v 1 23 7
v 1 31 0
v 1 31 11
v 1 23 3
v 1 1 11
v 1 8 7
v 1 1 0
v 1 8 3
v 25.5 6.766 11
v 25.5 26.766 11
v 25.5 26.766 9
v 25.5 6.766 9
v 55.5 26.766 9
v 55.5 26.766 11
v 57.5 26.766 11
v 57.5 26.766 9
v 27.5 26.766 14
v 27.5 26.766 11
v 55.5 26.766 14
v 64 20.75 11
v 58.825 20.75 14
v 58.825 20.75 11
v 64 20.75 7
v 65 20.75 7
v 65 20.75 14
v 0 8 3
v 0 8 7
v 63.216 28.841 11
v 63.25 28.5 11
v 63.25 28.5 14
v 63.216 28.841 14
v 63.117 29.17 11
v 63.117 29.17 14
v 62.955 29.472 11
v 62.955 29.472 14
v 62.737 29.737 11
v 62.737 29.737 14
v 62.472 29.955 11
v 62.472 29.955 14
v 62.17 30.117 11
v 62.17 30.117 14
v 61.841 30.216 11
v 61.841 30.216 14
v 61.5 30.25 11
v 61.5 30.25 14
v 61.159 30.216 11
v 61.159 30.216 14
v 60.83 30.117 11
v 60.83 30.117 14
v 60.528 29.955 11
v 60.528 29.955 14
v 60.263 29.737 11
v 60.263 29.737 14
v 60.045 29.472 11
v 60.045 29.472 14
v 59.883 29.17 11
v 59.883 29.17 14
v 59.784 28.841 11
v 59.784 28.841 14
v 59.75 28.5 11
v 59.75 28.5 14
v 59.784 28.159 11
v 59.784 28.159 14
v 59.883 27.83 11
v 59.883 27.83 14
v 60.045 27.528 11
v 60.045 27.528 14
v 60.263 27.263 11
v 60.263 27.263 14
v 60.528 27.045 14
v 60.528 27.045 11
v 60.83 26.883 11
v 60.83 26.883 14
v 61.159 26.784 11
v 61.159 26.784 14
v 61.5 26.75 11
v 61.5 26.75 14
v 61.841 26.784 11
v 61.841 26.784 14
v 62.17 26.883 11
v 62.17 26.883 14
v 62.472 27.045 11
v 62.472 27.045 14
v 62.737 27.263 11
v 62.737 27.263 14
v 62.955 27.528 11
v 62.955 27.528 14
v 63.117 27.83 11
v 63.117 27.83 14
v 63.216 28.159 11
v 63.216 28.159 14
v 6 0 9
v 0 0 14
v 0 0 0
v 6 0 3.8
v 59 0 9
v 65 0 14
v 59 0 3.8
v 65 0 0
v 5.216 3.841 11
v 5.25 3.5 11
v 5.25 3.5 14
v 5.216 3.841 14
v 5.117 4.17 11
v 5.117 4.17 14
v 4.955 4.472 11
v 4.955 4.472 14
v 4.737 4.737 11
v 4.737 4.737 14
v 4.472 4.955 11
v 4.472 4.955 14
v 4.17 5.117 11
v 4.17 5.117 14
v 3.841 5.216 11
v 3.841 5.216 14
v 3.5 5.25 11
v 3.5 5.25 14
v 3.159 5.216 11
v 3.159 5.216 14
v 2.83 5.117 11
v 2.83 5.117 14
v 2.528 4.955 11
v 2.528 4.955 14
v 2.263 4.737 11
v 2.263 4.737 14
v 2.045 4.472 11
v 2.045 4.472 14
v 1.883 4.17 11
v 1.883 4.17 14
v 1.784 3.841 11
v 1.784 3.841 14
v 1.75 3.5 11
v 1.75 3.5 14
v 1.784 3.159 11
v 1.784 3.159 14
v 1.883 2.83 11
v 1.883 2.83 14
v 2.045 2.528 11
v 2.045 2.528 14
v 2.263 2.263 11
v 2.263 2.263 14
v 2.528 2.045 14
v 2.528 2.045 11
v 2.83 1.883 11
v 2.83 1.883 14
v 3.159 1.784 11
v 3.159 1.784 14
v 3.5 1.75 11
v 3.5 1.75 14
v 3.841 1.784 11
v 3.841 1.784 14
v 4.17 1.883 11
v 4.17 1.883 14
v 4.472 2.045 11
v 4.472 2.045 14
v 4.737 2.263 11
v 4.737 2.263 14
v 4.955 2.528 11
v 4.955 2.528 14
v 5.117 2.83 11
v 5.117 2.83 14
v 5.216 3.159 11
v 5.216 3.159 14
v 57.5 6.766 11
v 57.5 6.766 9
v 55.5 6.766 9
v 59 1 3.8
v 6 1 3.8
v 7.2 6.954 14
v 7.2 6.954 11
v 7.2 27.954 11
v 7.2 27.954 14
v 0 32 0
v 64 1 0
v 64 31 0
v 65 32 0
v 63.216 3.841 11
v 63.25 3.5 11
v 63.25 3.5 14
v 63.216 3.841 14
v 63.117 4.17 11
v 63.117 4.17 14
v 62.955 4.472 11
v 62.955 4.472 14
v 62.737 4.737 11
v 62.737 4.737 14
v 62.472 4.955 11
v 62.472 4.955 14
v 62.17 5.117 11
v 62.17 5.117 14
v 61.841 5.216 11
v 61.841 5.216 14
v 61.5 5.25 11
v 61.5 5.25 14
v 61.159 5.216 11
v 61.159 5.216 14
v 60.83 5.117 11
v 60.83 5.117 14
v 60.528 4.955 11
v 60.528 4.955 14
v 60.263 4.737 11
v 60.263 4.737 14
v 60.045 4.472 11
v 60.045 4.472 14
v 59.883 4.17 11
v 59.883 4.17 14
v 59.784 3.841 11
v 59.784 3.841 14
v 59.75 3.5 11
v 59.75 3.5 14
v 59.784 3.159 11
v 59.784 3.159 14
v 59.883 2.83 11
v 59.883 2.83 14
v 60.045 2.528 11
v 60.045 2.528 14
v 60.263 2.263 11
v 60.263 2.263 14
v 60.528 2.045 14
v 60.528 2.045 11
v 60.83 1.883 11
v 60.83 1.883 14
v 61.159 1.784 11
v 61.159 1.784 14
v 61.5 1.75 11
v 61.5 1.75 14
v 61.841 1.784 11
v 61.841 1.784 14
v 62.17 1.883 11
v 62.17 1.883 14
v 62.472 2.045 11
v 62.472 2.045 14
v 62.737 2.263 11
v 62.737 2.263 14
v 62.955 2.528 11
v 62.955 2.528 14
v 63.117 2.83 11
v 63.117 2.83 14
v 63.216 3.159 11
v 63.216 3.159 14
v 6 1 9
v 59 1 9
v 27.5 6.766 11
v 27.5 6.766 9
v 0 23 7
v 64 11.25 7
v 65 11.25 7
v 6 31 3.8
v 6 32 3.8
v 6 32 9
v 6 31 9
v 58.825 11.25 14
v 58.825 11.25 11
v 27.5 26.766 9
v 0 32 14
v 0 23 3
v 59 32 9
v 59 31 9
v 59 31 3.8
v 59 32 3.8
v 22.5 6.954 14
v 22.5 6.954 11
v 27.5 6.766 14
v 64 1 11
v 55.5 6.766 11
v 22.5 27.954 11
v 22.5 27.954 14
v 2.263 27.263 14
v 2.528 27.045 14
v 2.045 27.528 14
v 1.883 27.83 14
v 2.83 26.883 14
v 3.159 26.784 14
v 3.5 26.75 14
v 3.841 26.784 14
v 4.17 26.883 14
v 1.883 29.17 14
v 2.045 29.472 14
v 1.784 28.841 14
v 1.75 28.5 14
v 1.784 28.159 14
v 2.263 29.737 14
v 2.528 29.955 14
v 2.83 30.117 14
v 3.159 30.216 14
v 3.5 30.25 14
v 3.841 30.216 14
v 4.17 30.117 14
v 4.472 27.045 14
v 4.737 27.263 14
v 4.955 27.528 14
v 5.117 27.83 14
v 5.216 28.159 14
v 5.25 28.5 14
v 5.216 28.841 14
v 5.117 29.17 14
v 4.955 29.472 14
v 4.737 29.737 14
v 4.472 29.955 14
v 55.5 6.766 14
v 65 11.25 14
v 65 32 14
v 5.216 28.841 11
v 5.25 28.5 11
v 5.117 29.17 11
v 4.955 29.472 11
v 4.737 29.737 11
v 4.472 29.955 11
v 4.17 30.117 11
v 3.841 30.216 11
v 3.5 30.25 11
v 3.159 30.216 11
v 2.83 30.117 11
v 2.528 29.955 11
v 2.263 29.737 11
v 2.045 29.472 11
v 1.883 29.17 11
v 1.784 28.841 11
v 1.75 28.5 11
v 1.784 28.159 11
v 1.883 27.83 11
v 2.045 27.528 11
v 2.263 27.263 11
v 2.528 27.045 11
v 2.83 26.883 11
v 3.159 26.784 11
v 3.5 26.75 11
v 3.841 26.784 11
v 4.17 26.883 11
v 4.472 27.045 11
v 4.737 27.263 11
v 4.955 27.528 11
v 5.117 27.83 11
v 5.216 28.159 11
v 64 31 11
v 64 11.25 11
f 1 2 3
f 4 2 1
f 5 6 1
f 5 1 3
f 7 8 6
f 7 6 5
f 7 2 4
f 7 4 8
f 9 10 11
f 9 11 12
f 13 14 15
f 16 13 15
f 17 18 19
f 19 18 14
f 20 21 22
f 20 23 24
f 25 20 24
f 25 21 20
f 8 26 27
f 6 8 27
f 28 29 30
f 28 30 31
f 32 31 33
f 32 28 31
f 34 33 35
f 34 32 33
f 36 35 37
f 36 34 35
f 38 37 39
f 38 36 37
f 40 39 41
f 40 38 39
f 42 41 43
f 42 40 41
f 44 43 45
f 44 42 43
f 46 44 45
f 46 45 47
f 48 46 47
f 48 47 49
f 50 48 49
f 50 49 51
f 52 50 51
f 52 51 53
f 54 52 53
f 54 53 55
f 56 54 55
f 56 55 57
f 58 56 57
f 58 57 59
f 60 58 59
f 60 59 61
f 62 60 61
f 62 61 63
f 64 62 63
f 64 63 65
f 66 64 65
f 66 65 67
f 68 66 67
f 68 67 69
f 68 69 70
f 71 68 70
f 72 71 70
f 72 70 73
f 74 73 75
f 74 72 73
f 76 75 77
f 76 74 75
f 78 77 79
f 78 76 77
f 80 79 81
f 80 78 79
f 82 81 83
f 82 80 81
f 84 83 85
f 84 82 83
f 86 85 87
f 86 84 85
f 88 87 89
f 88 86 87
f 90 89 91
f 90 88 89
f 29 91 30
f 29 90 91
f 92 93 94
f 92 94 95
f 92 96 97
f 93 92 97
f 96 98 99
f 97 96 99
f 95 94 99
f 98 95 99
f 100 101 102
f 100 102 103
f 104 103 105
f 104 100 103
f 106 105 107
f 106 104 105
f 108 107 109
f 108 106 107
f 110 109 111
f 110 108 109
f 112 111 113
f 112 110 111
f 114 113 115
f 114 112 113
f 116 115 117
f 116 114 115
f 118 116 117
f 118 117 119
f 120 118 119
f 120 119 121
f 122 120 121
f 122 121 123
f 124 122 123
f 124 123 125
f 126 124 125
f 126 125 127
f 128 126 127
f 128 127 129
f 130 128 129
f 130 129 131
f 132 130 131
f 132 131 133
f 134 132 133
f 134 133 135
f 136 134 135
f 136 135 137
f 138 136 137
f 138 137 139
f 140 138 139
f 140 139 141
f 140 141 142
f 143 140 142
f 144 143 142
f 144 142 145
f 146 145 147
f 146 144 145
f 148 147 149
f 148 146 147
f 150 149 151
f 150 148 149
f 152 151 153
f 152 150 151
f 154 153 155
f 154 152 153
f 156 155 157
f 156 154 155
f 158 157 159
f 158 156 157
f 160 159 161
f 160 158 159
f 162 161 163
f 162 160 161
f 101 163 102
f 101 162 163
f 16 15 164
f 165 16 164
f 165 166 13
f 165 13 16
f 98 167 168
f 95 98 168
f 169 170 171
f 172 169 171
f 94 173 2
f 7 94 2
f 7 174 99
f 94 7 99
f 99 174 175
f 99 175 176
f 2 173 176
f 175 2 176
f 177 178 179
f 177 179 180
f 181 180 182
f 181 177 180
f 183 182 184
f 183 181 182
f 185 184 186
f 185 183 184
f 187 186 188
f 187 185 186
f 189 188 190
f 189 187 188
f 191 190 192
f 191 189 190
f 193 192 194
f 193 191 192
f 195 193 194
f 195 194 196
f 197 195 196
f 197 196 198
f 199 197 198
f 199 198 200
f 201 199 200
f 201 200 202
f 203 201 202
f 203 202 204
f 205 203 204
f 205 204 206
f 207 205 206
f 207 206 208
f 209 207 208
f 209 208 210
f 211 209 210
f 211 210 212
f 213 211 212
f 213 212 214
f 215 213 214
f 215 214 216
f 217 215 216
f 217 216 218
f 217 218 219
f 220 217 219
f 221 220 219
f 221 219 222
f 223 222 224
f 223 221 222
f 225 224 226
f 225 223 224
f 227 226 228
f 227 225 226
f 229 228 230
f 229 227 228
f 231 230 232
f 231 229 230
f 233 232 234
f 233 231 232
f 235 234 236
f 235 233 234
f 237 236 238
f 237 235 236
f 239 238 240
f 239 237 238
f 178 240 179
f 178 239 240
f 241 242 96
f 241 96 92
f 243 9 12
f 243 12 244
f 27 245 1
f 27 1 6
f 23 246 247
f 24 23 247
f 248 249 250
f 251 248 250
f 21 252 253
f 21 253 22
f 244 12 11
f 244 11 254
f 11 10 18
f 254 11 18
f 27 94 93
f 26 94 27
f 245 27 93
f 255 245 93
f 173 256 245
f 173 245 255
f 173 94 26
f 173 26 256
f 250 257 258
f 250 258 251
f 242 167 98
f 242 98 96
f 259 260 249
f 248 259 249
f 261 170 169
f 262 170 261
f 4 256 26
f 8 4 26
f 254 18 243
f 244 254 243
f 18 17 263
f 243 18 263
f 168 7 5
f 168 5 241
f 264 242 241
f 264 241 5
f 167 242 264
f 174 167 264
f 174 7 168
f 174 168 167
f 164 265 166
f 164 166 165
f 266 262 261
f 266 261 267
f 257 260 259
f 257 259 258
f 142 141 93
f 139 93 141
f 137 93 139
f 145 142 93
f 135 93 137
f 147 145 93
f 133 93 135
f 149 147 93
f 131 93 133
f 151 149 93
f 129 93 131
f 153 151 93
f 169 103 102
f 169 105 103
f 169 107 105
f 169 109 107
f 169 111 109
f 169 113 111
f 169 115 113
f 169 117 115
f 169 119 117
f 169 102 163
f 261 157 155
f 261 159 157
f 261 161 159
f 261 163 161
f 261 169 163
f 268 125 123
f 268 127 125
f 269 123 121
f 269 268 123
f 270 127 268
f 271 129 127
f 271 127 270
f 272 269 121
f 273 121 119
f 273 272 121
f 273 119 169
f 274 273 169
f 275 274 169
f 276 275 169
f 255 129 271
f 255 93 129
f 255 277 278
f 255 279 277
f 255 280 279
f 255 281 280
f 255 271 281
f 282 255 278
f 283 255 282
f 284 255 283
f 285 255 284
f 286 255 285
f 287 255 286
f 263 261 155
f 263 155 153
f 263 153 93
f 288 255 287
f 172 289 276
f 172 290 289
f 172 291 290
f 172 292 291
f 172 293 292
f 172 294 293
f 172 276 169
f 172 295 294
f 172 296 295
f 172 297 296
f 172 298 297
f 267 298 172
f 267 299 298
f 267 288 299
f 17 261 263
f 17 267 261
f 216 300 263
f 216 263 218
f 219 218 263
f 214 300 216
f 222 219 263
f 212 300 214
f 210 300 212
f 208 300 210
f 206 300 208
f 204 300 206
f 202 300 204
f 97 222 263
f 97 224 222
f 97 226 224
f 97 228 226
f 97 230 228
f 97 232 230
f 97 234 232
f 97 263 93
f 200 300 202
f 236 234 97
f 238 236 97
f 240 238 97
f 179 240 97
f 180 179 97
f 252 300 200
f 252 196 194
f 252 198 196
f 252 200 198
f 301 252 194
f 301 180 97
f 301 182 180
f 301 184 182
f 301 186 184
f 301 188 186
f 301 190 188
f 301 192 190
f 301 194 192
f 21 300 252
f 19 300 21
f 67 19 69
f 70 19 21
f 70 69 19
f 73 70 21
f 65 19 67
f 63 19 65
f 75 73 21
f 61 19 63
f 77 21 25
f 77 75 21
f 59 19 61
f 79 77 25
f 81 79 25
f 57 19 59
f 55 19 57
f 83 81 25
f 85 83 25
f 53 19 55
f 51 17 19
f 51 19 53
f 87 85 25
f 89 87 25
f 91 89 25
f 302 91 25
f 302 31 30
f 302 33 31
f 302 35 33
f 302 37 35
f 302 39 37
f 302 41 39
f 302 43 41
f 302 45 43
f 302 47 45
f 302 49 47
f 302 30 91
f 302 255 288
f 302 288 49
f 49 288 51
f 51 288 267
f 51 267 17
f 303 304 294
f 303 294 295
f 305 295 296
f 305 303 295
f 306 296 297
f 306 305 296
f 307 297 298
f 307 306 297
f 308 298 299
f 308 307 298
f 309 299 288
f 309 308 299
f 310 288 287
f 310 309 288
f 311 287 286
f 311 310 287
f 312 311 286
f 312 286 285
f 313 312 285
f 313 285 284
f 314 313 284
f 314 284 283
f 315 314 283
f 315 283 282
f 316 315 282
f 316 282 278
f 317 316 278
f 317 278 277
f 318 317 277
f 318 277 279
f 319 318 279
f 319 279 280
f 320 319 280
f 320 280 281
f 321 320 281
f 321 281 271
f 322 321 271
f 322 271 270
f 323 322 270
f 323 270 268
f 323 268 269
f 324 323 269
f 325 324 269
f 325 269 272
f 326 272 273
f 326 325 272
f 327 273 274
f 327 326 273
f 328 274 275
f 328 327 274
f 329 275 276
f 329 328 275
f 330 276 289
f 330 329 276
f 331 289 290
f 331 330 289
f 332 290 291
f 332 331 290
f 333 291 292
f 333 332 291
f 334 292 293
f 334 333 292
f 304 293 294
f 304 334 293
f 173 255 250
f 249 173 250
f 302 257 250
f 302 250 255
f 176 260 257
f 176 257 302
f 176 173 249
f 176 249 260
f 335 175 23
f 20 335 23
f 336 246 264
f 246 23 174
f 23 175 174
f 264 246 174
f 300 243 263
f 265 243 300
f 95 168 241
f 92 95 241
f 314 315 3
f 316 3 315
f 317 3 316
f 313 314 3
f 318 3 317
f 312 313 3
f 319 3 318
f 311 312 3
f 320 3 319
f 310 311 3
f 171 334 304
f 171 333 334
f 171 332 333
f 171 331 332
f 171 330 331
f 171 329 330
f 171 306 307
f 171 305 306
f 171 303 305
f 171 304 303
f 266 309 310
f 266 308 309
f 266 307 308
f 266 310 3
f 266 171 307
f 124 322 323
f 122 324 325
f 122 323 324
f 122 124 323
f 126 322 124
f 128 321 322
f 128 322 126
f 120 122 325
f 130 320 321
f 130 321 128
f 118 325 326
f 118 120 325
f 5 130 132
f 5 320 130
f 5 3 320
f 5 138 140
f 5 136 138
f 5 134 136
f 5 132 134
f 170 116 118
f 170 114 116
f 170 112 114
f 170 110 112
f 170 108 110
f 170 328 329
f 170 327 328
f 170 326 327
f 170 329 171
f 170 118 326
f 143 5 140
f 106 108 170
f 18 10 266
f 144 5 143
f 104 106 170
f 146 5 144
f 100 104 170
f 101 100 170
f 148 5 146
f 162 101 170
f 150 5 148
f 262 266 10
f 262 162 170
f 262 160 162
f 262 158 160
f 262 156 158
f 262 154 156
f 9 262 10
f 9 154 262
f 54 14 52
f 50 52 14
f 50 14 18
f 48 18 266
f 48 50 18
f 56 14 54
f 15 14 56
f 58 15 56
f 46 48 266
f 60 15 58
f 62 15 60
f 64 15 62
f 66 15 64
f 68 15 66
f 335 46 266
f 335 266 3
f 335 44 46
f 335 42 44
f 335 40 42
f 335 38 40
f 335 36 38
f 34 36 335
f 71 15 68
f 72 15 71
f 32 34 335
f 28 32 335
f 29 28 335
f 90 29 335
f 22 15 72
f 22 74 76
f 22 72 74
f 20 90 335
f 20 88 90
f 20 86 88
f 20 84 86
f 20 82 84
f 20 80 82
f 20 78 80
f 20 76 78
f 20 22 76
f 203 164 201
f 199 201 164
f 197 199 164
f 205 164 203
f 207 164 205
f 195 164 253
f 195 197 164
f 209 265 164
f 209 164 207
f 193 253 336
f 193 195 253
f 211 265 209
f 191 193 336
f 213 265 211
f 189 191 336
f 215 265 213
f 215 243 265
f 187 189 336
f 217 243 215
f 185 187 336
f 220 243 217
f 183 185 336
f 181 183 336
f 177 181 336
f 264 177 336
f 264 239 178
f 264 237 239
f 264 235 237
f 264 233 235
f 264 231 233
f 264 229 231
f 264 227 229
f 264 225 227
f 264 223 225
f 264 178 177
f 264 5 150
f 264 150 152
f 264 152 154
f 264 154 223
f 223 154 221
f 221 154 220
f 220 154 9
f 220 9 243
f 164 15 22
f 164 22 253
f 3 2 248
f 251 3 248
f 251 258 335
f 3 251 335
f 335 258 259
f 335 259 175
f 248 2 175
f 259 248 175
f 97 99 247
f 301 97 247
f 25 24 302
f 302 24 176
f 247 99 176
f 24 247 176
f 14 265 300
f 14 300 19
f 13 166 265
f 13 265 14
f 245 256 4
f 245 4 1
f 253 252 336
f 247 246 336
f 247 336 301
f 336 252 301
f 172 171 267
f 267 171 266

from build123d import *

# Parameters (mm, degrees)
SKETCH_W        = 65
SKETCH_H        = 32
SKETCH_R        = 1.75
SKETCH_W_2      = 28
SKETCH_H_2      = 20
SKETCH_W_3      = 15.3
SKETCH_H_3      = 21
PAD_DEPTH       = 14
SKETCH001_W     = 63
SKETCH001_H     = 30
POCKET_DEPTH    = 11
SKETCH002_W     = 6.174751
SKETCH002_H     = 9.5
POCKET001_DEPTH = 7
SKETCH004_W     = 2
SKETCH004_H     = 20
PAD001_DEPTH    = 2
SKETCH005_W     = 15
SKETCH005_H     = 4
POCKET002_DEPTH = 5
SKETCH003_W     = 53
SKETCH003_H     = 5.2
POCKET003_DEPTH = 32.0010000001


with BuildPart() as part:
    # Sketch → Pad (new body)
    with BuildSketch(Plane.XY):
        with Locations((32.5, 16)):
            Rectangle(SKETCH_W, SKETCH_H)
        with Locations((3.5, 28.5)):
            Circle(SKETCH_R, mode=Mode.SUBTRACT)
        with Locations((61.4999634499, 28.5)):
            Circle(SKETCH_R, mode=Mode.SUBTRACT)
        with Locations((3.5, 3.5)):
            Circle(SKETCH_R, mode=Mode.SUBTRACT)
        with Locations((61.4999634499, 3.5)):
            Circle(SKETCH_R, mode=Mode.SUBTRACT)
        with Locations((41.4999634499, 16.7655958753)):
            Rectangle(SKETCH_W_2, SKETCH_H_2, mode=Mode.SUBTRACT)
        with Locations((14.8499634499, 17.4539391628)):
            Rectangle(SKETCH_W_3, SKETCH_H_3, mode=Mode.SUBTRACT)
    extrude(amount=PAD_DEPTH)

    # Sketch001 → Pocket (cut)
    with BuildSketch(Plane(origin=(0, 0, 0), x_dir=(1, 0, 0), z_dir=(0, 0, -1))):
        with Locations((32.5, -16)):
            Rectangle(SKETCH001_W, SKETCH001_H)
    extrude(amount=-POCKET_DEPTH, mode=Mode.SUBTRACT)

    # Sketch002 → Pocket001 (cut)
    with BuildSketch(Plane.XY.offset(14)):
        with Locations((61.9126245, 16)):
            Rectangle(SKETCH002_W, SKETCH002_H)
    extrude(amount=-POCKET001_DEPTH, mode=Mode.SUBTRACT)

    # Sketch004 → Pad001 (new body)
    with BuildSketch(Plane(origin=(0, 0, 11), x_dir=(1, 0, 0), z_dir=(0, 0, -1))):
        with Locations((26.4999634499, -16.7655958753)):
            Rectangle(SKETCH004_W, SKETCH004_H)
        with Locations((56.4999634499, -16.7655958753)):
            Rectangle(SKETCH004_W, SKETCH004_H)
    extrude(amount=PAD001_DEPTH)

    # Sketch005 → Pocket002 (cut)
    with BuildSketch(Plane(origin=(0, 0, 0), x_dir=(0, -1, 0), z_dir=(-1, 0, 0))):
        with Locations((-15.5, 5)):
            Rectangle(SKETCH005_W, SKETCH005_H)
    extrude(amount=-POCKET002_DEPTH, mode=Mode.SUBTRACT)

    # Sketch003 → Pocket003 (cut, through all)
    with BuildSketch(Plane(origin=(0, 32, 0), x_dir=(-1, 0, 0), z_dir=(0, 1, 0))):
        with Locations((-32.5, 6.4)):
            Rectangle(SKETCH003_W, SKETCH003_H)
    extrude(amount=-POCKET003_DEPTH, mode=Mode.SUBTRACT)


solid = part.part
